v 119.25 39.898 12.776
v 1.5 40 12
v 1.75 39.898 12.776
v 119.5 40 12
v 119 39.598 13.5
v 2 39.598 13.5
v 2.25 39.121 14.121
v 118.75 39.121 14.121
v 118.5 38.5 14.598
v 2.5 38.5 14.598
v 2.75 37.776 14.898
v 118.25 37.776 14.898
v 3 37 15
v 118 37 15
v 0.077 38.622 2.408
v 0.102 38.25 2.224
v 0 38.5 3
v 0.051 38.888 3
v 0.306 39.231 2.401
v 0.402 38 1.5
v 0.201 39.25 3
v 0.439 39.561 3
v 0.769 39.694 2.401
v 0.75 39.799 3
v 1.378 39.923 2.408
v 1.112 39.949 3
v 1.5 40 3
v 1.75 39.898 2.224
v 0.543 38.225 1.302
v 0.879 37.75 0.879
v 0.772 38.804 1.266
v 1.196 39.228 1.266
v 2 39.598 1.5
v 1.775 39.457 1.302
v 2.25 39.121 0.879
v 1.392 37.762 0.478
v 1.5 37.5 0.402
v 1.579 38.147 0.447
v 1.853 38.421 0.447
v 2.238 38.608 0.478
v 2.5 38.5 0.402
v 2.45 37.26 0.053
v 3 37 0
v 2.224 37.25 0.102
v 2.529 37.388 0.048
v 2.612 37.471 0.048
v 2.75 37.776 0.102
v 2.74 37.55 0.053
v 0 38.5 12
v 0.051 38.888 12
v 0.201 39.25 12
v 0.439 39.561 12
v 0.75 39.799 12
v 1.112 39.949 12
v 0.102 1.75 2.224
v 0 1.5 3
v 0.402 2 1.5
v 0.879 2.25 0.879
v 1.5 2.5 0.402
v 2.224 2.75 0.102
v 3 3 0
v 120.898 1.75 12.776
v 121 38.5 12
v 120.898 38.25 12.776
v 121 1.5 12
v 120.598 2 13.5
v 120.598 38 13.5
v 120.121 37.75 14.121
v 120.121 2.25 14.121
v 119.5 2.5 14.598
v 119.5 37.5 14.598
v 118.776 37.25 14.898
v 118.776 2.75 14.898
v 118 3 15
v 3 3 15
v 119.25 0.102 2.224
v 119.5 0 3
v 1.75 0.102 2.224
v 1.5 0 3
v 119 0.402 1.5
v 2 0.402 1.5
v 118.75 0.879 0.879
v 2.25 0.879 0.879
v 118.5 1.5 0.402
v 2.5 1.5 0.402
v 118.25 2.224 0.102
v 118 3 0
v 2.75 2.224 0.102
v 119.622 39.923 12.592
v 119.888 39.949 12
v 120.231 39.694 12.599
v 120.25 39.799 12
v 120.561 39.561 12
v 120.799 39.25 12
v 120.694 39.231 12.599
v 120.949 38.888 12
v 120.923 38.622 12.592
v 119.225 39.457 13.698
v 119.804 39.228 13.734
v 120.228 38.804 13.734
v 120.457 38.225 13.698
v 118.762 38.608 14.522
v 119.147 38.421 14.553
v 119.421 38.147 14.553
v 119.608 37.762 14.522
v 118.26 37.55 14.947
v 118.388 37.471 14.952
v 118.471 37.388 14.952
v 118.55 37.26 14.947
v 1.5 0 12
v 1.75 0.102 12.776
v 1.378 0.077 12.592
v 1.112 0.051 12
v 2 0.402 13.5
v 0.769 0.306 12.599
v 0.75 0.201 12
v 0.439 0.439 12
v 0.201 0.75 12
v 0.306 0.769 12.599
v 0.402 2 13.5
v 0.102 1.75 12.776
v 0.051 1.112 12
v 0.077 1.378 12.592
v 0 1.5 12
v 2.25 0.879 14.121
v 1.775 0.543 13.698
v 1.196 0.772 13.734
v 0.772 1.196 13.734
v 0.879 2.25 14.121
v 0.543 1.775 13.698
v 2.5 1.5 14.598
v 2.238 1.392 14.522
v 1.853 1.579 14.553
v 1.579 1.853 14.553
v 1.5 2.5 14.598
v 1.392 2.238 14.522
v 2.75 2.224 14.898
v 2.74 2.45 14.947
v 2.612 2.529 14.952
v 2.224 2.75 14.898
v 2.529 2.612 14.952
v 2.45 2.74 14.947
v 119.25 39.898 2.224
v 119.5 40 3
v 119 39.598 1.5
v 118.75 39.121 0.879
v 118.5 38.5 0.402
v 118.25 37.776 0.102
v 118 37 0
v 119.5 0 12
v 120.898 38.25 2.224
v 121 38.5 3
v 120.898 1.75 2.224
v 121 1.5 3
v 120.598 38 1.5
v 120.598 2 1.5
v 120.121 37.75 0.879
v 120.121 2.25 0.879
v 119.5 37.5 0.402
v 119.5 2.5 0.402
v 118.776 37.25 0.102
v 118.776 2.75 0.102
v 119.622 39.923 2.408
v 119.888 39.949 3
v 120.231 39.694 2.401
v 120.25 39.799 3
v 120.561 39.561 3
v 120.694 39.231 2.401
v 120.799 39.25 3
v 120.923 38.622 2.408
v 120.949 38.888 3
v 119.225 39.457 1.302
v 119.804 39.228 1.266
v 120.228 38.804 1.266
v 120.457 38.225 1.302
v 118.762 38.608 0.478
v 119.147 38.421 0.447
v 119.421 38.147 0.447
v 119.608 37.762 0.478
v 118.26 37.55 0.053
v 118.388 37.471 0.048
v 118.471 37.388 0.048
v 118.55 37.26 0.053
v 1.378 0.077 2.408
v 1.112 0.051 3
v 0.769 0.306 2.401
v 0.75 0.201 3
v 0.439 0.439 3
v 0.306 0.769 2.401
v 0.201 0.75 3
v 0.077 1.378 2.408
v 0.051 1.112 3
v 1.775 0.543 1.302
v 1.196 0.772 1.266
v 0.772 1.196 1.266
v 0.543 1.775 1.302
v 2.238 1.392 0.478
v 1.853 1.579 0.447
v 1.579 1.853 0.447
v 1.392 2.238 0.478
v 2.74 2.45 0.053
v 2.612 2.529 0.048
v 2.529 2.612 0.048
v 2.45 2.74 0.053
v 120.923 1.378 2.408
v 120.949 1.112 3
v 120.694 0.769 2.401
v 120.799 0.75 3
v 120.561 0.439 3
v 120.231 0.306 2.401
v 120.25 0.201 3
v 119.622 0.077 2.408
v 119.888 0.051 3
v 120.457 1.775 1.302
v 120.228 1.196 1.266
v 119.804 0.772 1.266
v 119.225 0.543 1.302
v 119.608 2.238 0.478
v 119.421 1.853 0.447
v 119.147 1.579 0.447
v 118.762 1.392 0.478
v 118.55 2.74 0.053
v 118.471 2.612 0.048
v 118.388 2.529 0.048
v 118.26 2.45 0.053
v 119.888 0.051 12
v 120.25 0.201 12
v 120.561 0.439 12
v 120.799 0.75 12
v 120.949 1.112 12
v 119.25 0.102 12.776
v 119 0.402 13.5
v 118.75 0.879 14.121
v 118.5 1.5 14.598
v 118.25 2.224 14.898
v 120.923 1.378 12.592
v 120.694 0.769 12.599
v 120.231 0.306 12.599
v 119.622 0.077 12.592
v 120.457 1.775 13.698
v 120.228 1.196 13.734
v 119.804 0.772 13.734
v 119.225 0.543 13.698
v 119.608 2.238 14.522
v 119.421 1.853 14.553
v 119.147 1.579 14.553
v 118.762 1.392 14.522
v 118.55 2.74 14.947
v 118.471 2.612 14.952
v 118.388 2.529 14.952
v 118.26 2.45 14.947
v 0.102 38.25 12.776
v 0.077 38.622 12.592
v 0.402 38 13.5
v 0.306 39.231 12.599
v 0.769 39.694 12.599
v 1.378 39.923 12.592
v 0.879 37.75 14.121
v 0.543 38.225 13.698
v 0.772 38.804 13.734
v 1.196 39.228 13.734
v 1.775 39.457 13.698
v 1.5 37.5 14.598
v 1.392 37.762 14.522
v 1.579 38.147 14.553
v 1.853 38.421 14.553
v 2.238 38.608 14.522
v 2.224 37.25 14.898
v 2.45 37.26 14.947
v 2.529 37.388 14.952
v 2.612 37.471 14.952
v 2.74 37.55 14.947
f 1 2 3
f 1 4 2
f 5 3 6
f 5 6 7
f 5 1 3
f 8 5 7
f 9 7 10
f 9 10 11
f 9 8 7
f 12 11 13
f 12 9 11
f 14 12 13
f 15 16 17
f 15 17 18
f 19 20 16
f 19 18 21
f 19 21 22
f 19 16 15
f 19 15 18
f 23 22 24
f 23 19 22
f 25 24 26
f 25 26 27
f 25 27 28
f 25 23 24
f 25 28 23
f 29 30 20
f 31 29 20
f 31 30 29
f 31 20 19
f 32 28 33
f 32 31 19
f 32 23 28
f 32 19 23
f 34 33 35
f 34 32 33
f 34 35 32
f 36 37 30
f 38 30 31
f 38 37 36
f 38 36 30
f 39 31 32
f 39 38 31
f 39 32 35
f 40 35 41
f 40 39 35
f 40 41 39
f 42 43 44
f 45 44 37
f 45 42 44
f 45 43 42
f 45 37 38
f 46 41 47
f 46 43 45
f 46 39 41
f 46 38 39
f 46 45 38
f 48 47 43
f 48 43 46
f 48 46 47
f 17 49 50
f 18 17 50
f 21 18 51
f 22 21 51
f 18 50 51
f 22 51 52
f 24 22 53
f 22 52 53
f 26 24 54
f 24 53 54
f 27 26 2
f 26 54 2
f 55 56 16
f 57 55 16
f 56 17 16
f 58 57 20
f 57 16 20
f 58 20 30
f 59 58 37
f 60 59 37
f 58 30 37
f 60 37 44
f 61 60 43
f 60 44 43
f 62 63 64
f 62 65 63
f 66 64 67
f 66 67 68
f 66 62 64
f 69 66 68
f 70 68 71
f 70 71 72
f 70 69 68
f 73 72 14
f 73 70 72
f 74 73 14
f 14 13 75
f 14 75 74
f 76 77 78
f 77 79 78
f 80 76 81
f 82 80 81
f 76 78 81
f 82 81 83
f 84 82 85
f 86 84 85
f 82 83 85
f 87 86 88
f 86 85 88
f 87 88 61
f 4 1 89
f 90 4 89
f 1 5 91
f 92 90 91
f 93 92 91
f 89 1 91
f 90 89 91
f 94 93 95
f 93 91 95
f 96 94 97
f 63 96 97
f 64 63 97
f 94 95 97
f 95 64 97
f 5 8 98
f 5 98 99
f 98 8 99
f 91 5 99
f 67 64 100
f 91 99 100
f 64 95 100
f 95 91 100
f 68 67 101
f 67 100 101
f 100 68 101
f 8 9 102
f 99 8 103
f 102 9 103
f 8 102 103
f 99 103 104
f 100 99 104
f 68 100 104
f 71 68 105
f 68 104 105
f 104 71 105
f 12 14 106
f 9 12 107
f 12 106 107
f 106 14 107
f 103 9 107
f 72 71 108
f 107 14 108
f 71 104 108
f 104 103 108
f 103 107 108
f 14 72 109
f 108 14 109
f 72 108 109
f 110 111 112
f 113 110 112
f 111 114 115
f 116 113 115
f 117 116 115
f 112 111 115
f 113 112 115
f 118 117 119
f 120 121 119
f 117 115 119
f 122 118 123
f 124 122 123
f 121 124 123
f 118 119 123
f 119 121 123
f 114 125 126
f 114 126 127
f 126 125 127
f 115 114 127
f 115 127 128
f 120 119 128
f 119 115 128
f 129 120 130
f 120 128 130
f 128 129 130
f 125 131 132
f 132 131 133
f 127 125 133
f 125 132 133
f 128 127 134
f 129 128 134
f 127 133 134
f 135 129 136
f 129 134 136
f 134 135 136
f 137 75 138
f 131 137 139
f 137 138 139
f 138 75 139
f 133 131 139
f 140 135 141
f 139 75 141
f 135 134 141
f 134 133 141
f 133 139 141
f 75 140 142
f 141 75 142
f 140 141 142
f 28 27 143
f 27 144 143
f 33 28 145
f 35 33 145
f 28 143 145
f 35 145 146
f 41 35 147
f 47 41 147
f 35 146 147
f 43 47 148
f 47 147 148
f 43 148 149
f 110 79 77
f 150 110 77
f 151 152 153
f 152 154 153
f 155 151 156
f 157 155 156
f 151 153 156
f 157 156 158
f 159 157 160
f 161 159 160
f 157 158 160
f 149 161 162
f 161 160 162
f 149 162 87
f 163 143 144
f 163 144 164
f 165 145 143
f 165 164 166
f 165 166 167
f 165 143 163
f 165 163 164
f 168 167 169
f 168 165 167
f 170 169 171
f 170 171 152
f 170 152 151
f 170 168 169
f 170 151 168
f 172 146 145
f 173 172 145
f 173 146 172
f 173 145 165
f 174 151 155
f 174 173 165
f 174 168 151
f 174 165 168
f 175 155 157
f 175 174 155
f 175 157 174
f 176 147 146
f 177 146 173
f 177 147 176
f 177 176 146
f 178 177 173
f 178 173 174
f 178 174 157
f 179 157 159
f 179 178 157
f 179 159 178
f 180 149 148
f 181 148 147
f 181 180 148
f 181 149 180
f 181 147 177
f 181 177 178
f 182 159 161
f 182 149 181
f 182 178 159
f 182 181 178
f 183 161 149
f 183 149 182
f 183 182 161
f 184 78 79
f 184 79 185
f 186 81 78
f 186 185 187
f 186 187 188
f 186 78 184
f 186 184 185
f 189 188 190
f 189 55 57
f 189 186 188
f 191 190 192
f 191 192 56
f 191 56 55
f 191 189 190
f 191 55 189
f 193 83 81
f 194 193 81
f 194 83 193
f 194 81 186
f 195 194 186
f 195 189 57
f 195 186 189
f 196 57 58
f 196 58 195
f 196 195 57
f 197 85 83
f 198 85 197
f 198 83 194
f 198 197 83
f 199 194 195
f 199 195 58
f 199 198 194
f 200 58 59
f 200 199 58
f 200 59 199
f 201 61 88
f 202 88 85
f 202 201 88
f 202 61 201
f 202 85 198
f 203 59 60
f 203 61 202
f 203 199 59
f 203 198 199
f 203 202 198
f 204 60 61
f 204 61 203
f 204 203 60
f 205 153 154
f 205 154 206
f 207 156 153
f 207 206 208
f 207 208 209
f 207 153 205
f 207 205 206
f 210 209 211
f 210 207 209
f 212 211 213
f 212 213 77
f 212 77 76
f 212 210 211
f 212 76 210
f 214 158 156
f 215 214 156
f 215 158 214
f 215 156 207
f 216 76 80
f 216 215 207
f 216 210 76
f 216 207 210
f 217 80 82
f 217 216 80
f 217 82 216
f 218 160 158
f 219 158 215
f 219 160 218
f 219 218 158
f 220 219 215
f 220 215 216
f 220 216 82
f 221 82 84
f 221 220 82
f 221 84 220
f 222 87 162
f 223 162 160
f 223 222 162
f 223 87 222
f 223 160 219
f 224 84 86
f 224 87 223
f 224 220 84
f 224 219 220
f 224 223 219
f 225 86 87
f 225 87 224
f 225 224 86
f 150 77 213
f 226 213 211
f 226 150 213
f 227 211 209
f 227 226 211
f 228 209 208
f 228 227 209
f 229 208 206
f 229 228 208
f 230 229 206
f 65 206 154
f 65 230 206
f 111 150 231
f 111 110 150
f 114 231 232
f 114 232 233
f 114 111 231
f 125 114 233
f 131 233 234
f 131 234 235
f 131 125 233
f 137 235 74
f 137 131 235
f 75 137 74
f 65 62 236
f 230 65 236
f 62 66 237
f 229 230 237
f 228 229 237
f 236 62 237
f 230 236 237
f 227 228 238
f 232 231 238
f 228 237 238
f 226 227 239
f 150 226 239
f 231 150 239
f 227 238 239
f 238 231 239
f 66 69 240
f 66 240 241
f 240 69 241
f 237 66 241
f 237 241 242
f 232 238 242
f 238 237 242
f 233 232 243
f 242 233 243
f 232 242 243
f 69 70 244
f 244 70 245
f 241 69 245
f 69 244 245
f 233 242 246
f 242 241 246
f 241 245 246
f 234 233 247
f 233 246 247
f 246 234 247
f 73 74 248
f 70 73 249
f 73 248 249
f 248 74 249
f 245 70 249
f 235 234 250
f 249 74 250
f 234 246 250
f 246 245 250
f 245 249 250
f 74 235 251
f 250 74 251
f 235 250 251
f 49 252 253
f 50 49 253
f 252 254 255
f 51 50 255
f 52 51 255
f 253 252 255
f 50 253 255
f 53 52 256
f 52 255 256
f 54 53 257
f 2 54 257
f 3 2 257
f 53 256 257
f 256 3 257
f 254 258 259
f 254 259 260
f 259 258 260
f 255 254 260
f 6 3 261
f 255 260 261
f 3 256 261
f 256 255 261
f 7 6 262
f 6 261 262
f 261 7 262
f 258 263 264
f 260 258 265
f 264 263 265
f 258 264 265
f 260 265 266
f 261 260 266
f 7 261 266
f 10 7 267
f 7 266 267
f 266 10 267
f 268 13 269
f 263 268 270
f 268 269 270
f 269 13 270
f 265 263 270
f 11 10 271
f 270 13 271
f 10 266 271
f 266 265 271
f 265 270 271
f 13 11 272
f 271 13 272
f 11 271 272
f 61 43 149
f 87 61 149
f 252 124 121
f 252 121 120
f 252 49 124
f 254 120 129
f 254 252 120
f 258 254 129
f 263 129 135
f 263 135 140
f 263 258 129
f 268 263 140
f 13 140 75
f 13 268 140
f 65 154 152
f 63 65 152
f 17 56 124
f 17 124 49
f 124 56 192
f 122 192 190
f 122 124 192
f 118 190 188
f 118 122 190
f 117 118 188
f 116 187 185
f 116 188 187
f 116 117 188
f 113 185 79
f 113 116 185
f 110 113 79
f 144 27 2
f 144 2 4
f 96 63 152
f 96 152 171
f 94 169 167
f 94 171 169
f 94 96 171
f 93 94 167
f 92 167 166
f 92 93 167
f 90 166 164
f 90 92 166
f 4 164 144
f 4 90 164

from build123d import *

# Parameters (mm, degrees)
BOX_W       = 121
BOX_H       = 40
BOX_DEPTH   = 15
FILLET_R    = 1.5
FILLET003_R = 3


with BuildPart() as part:
    # Box → Box (new body)
    with BuildSketch(Plane.XY):
        with Locations((60.5, 20)):
            Rectangle(BOX_W, BOX_H)
    extrude(amount=BOX_DEPTH)

    # Fillet
    fillet_edges = [part.edges().sort_by_distance(p)[0] for p in [
        (0, 0, 7.5),
        (0, 40, 7.5),
        (121, 0, 7.5),
        (121, 40, 7.5),
    ]]
    fillet(fillet_edges, radius=FILLET_R)

    # Fillet003
    fillet003_edges = [part.edges().sort_by_distance(p)[0] for p in [
        (0, 20, 15),
        (0, 20, 0),
        (0.43934, 0.43934, 15),
        (60.5, 0, 15),
        (120.56066, 0.43934, 15),
        (121, 20, 15),
        (120.56066, 39.56066, 15),
        (60.5, 40, 15),
        (0.43934, 39.56066, 15),
        (0.43934, 0.43934, 0),
        (0.43934, 39.56066, 0),
        (60.5, 0, 0),
        (120.56066, 0.43934, 0),
        (121, 20, 0),
        (120.56066, 39.56066, 0),
        (60.5, 40, 0),
    ]]
    fillet(fillet003_edges, radius=FILLET003_R)


solid = part.part
